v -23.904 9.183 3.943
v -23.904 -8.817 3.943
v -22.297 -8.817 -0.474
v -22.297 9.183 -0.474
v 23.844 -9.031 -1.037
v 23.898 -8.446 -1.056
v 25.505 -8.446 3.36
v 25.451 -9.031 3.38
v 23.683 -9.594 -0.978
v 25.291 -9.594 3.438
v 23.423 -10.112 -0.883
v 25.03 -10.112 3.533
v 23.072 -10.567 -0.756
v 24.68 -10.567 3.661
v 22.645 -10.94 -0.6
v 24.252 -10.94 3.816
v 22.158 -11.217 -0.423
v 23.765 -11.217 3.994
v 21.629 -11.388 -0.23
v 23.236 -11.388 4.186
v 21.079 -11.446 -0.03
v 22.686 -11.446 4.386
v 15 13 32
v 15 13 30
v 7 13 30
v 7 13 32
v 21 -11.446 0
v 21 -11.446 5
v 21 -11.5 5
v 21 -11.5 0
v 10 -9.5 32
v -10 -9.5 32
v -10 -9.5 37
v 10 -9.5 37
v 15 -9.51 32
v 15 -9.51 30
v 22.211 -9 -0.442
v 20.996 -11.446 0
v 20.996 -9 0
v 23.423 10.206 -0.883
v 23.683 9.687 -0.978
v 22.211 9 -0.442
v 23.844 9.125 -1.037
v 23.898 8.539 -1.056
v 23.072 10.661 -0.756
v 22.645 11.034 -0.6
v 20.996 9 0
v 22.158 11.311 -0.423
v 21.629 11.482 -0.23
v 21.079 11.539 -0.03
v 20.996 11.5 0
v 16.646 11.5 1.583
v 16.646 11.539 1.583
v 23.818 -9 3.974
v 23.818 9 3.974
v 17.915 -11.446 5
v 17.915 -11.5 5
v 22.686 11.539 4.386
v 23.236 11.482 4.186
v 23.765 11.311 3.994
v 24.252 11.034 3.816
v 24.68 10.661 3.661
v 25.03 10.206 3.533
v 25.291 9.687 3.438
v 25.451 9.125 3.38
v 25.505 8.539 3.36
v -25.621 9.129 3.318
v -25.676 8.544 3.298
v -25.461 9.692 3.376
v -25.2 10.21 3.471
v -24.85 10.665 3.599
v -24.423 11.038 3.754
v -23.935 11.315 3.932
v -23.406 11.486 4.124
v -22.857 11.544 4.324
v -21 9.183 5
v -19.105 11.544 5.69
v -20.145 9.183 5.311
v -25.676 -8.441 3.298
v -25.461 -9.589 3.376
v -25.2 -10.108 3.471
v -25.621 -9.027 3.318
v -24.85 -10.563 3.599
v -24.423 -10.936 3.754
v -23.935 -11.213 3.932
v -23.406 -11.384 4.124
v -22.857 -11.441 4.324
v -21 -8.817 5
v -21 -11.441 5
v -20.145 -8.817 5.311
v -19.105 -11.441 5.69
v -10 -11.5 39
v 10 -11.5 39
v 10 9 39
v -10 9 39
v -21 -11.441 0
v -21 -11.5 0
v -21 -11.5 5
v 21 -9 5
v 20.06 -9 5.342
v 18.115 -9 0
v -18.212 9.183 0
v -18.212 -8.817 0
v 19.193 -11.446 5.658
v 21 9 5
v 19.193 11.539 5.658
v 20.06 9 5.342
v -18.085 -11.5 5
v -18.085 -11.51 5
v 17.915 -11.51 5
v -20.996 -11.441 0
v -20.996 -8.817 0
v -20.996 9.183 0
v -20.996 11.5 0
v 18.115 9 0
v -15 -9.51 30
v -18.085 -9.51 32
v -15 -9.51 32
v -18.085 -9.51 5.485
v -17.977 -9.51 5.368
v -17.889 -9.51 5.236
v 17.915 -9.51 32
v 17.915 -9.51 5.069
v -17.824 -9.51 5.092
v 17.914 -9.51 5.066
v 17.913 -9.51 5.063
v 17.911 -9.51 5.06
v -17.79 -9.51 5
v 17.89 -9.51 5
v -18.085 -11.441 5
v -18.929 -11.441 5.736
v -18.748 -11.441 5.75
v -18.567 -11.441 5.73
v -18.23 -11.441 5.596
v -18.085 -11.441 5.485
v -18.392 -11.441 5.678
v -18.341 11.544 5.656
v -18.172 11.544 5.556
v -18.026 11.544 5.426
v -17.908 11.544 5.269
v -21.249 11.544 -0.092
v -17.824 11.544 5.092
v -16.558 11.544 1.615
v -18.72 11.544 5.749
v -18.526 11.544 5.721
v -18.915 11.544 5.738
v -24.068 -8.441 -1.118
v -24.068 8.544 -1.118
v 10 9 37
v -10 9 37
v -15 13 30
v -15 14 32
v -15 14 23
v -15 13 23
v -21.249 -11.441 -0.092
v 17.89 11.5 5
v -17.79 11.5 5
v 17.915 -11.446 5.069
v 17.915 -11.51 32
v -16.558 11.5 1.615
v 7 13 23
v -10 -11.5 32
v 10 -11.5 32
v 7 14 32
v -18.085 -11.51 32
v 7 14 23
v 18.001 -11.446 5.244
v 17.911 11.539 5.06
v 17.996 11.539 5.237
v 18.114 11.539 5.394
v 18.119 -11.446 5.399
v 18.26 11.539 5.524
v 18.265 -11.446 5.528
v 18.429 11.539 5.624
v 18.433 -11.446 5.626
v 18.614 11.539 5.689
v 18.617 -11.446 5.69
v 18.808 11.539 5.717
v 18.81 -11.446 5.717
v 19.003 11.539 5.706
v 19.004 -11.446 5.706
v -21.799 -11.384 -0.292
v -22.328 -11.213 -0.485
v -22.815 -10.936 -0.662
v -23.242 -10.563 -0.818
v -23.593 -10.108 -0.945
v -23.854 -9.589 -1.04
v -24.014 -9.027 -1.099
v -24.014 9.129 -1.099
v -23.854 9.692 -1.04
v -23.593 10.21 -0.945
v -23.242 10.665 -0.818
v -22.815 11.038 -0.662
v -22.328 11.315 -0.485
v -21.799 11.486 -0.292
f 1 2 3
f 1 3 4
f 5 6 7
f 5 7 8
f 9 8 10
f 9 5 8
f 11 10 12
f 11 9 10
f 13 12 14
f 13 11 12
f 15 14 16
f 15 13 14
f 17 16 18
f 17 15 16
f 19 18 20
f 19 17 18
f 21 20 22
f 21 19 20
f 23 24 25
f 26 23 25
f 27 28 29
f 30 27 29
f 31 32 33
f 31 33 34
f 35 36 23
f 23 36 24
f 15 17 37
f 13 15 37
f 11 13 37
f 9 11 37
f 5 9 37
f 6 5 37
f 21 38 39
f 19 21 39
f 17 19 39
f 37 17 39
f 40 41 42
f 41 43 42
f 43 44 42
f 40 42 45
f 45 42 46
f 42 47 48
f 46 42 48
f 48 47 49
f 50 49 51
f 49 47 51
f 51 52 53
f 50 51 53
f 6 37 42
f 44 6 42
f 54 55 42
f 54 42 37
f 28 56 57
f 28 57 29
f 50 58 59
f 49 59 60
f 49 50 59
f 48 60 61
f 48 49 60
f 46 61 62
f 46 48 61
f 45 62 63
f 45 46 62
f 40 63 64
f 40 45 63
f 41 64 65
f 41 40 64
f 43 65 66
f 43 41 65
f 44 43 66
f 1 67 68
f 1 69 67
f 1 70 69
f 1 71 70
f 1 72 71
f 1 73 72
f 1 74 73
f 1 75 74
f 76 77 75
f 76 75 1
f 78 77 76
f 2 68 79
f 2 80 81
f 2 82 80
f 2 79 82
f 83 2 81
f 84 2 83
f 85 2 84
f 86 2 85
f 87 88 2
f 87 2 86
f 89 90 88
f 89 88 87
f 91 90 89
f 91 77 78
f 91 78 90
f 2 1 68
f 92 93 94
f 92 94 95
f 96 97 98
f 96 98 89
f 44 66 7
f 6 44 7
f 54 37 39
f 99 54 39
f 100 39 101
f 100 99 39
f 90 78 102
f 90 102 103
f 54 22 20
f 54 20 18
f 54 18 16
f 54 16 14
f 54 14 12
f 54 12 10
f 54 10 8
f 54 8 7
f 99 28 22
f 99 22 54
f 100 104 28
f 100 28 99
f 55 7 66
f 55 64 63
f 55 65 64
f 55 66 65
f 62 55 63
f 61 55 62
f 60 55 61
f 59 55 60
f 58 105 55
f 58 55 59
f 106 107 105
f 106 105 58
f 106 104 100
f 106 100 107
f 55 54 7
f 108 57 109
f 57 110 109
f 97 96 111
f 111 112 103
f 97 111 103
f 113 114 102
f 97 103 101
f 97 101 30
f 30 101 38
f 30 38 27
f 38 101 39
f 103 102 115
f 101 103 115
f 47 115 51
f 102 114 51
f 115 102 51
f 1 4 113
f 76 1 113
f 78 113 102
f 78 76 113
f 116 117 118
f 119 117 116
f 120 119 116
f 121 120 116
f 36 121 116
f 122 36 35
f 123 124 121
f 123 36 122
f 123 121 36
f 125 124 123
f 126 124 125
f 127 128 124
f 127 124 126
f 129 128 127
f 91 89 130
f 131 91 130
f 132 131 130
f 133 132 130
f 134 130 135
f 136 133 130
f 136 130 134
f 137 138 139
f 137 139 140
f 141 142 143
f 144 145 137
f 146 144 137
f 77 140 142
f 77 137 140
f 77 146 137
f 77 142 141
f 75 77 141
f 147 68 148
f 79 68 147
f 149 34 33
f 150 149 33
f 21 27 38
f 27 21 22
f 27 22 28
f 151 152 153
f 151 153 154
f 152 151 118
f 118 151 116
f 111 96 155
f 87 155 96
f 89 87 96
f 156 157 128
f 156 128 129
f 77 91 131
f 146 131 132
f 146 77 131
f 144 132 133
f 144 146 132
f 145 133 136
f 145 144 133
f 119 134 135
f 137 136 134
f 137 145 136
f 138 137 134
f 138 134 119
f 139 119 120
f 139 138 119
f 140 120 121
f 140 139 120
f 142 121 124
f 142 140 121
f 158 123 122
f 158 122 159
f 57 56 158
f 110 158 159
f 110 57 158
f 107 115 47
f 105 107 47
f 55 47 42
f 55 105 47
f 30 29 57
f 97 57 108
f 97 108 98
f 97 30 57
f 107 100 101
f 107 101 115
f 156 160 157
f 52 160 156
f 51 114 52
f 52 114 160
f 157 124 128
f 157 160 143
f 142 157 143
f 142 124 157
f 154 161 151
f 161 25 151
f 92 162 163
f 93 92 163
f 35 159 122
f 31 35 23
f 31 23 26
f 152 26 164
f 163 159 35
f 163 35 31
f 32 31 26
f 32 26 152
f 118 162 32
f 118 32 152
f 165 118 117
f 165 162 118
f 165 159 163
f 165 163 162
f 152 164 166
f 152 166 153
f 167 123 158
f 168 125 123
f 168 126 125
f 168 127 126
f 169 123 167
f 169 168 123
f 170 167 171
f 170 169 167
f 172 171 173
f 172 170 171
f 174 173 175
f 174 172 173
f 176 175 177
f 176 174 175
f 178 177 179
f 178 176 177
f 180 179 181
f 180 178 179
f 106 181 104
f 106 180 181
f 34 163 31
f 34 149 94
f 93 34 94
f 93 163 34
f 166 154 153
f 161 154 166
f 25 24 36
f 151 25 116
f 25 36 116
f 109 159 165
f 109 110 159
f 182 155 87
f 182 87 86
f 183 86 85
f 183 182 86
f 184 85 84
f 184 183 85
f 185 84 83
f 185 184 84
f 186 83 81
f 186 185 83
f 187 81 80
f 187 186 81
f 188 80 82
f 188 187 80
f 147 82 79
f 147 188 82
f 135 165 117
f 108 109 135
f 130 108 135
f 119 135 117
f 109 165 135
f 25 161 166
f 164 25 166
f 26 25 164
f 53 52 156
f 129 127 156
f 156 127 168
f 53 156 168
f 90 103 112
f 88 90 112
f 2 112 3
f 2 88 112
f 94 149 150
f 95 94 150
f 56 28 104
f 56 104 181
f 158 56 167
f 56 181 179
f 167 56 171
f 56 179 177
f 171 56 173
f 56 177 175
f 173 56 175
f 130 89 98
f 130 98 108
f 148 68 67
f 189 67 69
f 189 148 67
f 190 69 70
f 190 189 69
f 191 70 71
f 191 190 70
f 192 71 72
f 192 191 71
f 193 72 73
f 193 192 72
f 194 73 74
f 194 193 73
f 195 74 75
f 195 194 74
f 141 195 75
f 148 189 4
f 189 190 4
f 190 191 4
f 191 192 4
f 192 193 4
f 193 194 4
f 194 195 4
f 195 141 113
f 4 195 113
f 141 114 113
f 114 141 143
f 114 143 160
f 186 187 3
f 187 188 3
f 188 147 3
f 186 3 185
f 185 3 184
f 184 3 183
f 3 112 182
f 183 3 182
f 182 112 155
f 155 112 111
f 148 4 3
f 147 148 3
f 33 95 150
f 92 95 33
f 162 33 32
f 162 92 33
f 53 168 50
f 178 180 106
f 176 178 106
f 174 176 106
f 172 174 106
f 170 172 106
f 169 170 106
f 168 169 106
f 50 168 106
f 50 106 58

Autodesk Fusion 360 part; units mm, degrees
sketch "Sketch1" plane through (0, 0, 0) normal (0, 0, 1) x (1, 0, 0)
  line L0 (-21, 11.5) -> (21, 11.5)
  line L1 (21, 11.5) -> (21, -11.5)
  line L2 (21, -11.5) -> (-21, -11.5)
  line L3 (-21, -11.5) -> (-21, 11.5)
  line L4 (-21, 11.5) -> (21, -11.5) construction
  line L5 (21, 11.5) -> (-21, -11.5) construction
  dimension "d1" = 42
  dimension "d2" = 23
extrude "Extrude1" add sketch "Sketch1" along normal blind 5
sketch "Sketch3" plane through (0, 0, 5) normal (0, 0, 1) x (-1, 0, 0)
  line L0 (21, 11.5) -> (-21, 11.5)
  line L1 (-21, 11.5) -> (-21, -11.5)
  line L2 (-21, -11.5) -> (21, -11.5)
  line L3 (21, -11.5) -> (21, 11.5)
  line L4 (-17.9148, 11.5098) -> (18.0852, 11.5098)
  line L5 (18.0852, 11.5098) -> (18.0852, 9.5098)
  line L6 (18.0852, 9.5098) -> (-17.9148, 9.5098)
  line L7 (-17.9148, 9.5098) -> (-17.9148, 11.5098)
  line L8 (-17.9148, 11.5098) -> (18.0852, 9.5098) construction
  line L9 (18.0852, 11.5098) -> (-17.9148, 9.5098) construction
  point P0 (0.0852, 10.5098)
  dimension "d44" = 36
  dimension "d45" = 2
extrude "Extrude3" add sketch "Sketch3" along normal blind 25 contours L0 L5 L6 L7 | L0 L4 L5 L7
sketch "Sketch4" plane through (0, 0, 30) normal (0, 0, 1) x (-1, 0, 0)
  line L0 (15, 10.5175) -> (-15, 10.5175)
  line L1 (-15, 10.5175) -> (-15, -13)
  line L2 (-15, -13) -> (15, -13)
  line L3 (15, -13) -> (15, 10.5175)
  line L4 (-17.9148, 9.5098) -> (18.0852, 9.5098)
  line L5 (18.0852, 9.5098) -> (18.0852, 11.5098)
  line L6 (18.0852, 11.5098) -> (-17.9148, 11.5098)
  line L7 (-17.9148, 11.5098) -> (-17.9148, 9.5098)
extrude "Extrude4" add sketch "Sketch4" along normal blind 2
ref_plane "WorkPlane1" through (21, 0, 5) normal (0.342, 0, 0.9397) x (0, 1, 0)
sketch "Sketch7" plane through (4.0635, 0, 11.1644) normal (0.342, 0, 0.9397) x (0, 1, 0)
  line L0 (-11.4455, -15.1007) -> (11.5394, -15.1007)
  line L1 (11.5394, -15.1007) -> (11.5394, -22.8179)
  line L2 (11.5394, -22.8179) -> (-11.4455, -22.8179)
  line L3 (-11.4455, -22.8179) -> (-11.4455, -15.1007)
extrude "Extrude7" add sketch "Sketch7" against normal blind 4.7
fillet "Fillet1" radius 3 2 edges at (24.7015, -11.4455, 1.1519) (24.7015, 11.5394, 1.1519)
fillet "Fillet2" radius 1 1 edges at (18.2536, 0.0469, 5.9996)
sketch "Sketch8" plane through (4.0635, 0, 11.1644) normal (0.342, 0, 0.9397) x (0, 1, 0)
  line L0 (11.5394, -16.1007) -> (-11.4455, -16.1007)
  line L1 (-8.4455, -22.8179) -> (8.5394, -22.8179)
  arc A0 (8.5394, -22.8179) -> (11.5394, -19.8179) centre (8.5394, -19.8179) ccw
  line L2 (11.5394, -19.8179) -> (11.5394, -16.1007)
  line L3 (-9, -17.0226) -> (9, -17.0226)
  line L4 (9, -17.0226) -> (9, -21.0226)
  line L5 (9, -21.0226) -> (-9, -21.0226)
  line L6 (-9, -21.0226) -> (-9, -17.0226)
  line L7 (-11.4455, -16.1007) -> (-11.4455, -18.0234)
  line L8 (-11.4455, -18.0234) -> (-11.4455, -19.8179)
  arc A1 (-11.4455, -19.8179) -> (-8.4455, -22.8179) centre (-8.4455, -19.8179) ccw
extrude "Extrude8" cut sketch "Sketch8" against normal blind 8 contours L3 L4 L5 L6
ref_plane "WorkPlane2" through (-21, 0, 5) normal (-0.342, 0, 0.9397) x (0, -1, 0)
sketch "Sketch9" plane through (4.0635, 0, 11.1644) normal (0.342, 0, 0.9397) x (0, 1, 0)
sketch "Sketch10" plane through (-4.0635, 0, 11.1644) normal (-0.342, 0, 0.9397) x (0, -1, 0)
  line L0 (11.4414, -15.0071) -> (-11.5436, -15.0071)
  line L1 (-11.5436, -15.0071) -> (-11.5436, -22.9991)
  line L2 (-11.5436, -22.9991) -> (11.4414, -22.9991)
  line L3 (11.4414, -22.9991) -> (11.4414, -15.0071)
  dimension "d29" = 22.985
  dimension "d30" = 7.992
extrude "Extrude9" add sketch "Sketch10" against normal blind 4.7
fillet "Fillet3" radius 3 2 edges at (-24.8718, -11.4414, 1.09) (-24.8718, 11.5436, 1.09)
sketch "Sketch11" plane through (4.0635, 0, 11.1644) normal (0.342, 0, 0.9397) x (0, 1, 0)
sketch "Sketch12" plane through (-4.0635, 0, 11.1644) normal (-0.342, 0, 0.9397) x (0, -1, 0)
  arc A0 (-11.5436, -19.9991) -> (-8.5436, -22.9991) centre (-8.5436, -19.9991) ccw
  line L0 (-8.5436, -22.9991) -> (8.4414, -22.9991)
  line L1 (11.4414, -19.9991) -> (11.4414, -18.0234)
  line L2 (11.4414, -15.0071) -> (-11.5436, -15.0071)
  line L3 (-11.5436, -15.0071) -> (-11.5436, -19.9991)
  line L4 (-9.1832, -17.1141) -> (8.8168, -17.1141)
  line L5 (8.8168, -17.1141) -> (8.8168, -21.1141)
  line L6 (8.8168, -21.1141) -> (-9.1832, -21.1141)
  line L7 (-9.1832, -21.1141) -> (-9.1832, -17.1141)
  arc A1 (8.4414, -22.9991) -> (11.4414, -19.9991) centre (8.4414, -19.9991) ccw
  line L8 (11.4414, -18.0234) -> (11.4414, -15.0071)
  dimension "d35" = 18
  dimension "d36" = 4
extrude "Extrude10" cut sketch "Sketch12" against normal blind 15 contours L4 L5 L6 L7
sketch "Sketch15" plane through (0, 13, 0) normal (0, 1, 0) x (-1, 0, 0)
  line L0 (-15, 30) -> (15, 30)
  line L1 (15, 30) -> (15, 32)
  line L2 (15, 32) -> (-15, 32)
  line L3 (-15, 32) -> (-15, 30)
  line L4 (-7, 32) -> (15, 32)
  line L5 (15, 32) -> (15, 23)
  line L6 (15, 23) -> (-7, 23)
  line L7 (-7, 23) -> (-7, 32)
extrude "Extrude12" add sketch "Sketch15" along normal blind 1 contours L0 L1 L2 L4 L5 L7 | L0 L5 L6 L7
fillet "Fillet4" radius 1 1 edges at (-18.1656, 0.0511, 6.0317)
ref_plane "WorkPlane3" through (0, -11.5, 0) normal (0, 1, 0) x (0, 0, 1)
sketch "Sketch18" plane through (0, -11.5, 0) normal (0, 1, 0) x (1, 0, 0)
  line L0 (-10, -32) -> (10, -32)
  line L1 (10, -32) -> (10, -37)
  line L2 (10, -37) -> (-10, -37)
  line L3 (-10, -37) -> (-10, -32)
extrude "Extrude13" add sketch "Sketch18" along normal blind 2
sketch "Sketch19" plane through (0, 0, 37) normal (0, 0, 1) x (-1, 0, 0)
  line L0 (10, 11.5) -> (-10, 11.5)
  line L1 (-10, 11.5) -> (-10, 9.5)
  line L2 (-10, 9.5) -> (10, 9.5)
  line L3 (10, 9.5) -> (10, 11.5)
  line L4 (10, 11.5) -> (-10, 11.5)
  line L5 (-10, 11.5) -> (-10, -9)
  line L6 (-10, -9) -> (10, -9)
  line L7 (10, -9) -> (10, 11.5)
extrude "Extrude14" add sketch "Sketch19" along normal blind 2
